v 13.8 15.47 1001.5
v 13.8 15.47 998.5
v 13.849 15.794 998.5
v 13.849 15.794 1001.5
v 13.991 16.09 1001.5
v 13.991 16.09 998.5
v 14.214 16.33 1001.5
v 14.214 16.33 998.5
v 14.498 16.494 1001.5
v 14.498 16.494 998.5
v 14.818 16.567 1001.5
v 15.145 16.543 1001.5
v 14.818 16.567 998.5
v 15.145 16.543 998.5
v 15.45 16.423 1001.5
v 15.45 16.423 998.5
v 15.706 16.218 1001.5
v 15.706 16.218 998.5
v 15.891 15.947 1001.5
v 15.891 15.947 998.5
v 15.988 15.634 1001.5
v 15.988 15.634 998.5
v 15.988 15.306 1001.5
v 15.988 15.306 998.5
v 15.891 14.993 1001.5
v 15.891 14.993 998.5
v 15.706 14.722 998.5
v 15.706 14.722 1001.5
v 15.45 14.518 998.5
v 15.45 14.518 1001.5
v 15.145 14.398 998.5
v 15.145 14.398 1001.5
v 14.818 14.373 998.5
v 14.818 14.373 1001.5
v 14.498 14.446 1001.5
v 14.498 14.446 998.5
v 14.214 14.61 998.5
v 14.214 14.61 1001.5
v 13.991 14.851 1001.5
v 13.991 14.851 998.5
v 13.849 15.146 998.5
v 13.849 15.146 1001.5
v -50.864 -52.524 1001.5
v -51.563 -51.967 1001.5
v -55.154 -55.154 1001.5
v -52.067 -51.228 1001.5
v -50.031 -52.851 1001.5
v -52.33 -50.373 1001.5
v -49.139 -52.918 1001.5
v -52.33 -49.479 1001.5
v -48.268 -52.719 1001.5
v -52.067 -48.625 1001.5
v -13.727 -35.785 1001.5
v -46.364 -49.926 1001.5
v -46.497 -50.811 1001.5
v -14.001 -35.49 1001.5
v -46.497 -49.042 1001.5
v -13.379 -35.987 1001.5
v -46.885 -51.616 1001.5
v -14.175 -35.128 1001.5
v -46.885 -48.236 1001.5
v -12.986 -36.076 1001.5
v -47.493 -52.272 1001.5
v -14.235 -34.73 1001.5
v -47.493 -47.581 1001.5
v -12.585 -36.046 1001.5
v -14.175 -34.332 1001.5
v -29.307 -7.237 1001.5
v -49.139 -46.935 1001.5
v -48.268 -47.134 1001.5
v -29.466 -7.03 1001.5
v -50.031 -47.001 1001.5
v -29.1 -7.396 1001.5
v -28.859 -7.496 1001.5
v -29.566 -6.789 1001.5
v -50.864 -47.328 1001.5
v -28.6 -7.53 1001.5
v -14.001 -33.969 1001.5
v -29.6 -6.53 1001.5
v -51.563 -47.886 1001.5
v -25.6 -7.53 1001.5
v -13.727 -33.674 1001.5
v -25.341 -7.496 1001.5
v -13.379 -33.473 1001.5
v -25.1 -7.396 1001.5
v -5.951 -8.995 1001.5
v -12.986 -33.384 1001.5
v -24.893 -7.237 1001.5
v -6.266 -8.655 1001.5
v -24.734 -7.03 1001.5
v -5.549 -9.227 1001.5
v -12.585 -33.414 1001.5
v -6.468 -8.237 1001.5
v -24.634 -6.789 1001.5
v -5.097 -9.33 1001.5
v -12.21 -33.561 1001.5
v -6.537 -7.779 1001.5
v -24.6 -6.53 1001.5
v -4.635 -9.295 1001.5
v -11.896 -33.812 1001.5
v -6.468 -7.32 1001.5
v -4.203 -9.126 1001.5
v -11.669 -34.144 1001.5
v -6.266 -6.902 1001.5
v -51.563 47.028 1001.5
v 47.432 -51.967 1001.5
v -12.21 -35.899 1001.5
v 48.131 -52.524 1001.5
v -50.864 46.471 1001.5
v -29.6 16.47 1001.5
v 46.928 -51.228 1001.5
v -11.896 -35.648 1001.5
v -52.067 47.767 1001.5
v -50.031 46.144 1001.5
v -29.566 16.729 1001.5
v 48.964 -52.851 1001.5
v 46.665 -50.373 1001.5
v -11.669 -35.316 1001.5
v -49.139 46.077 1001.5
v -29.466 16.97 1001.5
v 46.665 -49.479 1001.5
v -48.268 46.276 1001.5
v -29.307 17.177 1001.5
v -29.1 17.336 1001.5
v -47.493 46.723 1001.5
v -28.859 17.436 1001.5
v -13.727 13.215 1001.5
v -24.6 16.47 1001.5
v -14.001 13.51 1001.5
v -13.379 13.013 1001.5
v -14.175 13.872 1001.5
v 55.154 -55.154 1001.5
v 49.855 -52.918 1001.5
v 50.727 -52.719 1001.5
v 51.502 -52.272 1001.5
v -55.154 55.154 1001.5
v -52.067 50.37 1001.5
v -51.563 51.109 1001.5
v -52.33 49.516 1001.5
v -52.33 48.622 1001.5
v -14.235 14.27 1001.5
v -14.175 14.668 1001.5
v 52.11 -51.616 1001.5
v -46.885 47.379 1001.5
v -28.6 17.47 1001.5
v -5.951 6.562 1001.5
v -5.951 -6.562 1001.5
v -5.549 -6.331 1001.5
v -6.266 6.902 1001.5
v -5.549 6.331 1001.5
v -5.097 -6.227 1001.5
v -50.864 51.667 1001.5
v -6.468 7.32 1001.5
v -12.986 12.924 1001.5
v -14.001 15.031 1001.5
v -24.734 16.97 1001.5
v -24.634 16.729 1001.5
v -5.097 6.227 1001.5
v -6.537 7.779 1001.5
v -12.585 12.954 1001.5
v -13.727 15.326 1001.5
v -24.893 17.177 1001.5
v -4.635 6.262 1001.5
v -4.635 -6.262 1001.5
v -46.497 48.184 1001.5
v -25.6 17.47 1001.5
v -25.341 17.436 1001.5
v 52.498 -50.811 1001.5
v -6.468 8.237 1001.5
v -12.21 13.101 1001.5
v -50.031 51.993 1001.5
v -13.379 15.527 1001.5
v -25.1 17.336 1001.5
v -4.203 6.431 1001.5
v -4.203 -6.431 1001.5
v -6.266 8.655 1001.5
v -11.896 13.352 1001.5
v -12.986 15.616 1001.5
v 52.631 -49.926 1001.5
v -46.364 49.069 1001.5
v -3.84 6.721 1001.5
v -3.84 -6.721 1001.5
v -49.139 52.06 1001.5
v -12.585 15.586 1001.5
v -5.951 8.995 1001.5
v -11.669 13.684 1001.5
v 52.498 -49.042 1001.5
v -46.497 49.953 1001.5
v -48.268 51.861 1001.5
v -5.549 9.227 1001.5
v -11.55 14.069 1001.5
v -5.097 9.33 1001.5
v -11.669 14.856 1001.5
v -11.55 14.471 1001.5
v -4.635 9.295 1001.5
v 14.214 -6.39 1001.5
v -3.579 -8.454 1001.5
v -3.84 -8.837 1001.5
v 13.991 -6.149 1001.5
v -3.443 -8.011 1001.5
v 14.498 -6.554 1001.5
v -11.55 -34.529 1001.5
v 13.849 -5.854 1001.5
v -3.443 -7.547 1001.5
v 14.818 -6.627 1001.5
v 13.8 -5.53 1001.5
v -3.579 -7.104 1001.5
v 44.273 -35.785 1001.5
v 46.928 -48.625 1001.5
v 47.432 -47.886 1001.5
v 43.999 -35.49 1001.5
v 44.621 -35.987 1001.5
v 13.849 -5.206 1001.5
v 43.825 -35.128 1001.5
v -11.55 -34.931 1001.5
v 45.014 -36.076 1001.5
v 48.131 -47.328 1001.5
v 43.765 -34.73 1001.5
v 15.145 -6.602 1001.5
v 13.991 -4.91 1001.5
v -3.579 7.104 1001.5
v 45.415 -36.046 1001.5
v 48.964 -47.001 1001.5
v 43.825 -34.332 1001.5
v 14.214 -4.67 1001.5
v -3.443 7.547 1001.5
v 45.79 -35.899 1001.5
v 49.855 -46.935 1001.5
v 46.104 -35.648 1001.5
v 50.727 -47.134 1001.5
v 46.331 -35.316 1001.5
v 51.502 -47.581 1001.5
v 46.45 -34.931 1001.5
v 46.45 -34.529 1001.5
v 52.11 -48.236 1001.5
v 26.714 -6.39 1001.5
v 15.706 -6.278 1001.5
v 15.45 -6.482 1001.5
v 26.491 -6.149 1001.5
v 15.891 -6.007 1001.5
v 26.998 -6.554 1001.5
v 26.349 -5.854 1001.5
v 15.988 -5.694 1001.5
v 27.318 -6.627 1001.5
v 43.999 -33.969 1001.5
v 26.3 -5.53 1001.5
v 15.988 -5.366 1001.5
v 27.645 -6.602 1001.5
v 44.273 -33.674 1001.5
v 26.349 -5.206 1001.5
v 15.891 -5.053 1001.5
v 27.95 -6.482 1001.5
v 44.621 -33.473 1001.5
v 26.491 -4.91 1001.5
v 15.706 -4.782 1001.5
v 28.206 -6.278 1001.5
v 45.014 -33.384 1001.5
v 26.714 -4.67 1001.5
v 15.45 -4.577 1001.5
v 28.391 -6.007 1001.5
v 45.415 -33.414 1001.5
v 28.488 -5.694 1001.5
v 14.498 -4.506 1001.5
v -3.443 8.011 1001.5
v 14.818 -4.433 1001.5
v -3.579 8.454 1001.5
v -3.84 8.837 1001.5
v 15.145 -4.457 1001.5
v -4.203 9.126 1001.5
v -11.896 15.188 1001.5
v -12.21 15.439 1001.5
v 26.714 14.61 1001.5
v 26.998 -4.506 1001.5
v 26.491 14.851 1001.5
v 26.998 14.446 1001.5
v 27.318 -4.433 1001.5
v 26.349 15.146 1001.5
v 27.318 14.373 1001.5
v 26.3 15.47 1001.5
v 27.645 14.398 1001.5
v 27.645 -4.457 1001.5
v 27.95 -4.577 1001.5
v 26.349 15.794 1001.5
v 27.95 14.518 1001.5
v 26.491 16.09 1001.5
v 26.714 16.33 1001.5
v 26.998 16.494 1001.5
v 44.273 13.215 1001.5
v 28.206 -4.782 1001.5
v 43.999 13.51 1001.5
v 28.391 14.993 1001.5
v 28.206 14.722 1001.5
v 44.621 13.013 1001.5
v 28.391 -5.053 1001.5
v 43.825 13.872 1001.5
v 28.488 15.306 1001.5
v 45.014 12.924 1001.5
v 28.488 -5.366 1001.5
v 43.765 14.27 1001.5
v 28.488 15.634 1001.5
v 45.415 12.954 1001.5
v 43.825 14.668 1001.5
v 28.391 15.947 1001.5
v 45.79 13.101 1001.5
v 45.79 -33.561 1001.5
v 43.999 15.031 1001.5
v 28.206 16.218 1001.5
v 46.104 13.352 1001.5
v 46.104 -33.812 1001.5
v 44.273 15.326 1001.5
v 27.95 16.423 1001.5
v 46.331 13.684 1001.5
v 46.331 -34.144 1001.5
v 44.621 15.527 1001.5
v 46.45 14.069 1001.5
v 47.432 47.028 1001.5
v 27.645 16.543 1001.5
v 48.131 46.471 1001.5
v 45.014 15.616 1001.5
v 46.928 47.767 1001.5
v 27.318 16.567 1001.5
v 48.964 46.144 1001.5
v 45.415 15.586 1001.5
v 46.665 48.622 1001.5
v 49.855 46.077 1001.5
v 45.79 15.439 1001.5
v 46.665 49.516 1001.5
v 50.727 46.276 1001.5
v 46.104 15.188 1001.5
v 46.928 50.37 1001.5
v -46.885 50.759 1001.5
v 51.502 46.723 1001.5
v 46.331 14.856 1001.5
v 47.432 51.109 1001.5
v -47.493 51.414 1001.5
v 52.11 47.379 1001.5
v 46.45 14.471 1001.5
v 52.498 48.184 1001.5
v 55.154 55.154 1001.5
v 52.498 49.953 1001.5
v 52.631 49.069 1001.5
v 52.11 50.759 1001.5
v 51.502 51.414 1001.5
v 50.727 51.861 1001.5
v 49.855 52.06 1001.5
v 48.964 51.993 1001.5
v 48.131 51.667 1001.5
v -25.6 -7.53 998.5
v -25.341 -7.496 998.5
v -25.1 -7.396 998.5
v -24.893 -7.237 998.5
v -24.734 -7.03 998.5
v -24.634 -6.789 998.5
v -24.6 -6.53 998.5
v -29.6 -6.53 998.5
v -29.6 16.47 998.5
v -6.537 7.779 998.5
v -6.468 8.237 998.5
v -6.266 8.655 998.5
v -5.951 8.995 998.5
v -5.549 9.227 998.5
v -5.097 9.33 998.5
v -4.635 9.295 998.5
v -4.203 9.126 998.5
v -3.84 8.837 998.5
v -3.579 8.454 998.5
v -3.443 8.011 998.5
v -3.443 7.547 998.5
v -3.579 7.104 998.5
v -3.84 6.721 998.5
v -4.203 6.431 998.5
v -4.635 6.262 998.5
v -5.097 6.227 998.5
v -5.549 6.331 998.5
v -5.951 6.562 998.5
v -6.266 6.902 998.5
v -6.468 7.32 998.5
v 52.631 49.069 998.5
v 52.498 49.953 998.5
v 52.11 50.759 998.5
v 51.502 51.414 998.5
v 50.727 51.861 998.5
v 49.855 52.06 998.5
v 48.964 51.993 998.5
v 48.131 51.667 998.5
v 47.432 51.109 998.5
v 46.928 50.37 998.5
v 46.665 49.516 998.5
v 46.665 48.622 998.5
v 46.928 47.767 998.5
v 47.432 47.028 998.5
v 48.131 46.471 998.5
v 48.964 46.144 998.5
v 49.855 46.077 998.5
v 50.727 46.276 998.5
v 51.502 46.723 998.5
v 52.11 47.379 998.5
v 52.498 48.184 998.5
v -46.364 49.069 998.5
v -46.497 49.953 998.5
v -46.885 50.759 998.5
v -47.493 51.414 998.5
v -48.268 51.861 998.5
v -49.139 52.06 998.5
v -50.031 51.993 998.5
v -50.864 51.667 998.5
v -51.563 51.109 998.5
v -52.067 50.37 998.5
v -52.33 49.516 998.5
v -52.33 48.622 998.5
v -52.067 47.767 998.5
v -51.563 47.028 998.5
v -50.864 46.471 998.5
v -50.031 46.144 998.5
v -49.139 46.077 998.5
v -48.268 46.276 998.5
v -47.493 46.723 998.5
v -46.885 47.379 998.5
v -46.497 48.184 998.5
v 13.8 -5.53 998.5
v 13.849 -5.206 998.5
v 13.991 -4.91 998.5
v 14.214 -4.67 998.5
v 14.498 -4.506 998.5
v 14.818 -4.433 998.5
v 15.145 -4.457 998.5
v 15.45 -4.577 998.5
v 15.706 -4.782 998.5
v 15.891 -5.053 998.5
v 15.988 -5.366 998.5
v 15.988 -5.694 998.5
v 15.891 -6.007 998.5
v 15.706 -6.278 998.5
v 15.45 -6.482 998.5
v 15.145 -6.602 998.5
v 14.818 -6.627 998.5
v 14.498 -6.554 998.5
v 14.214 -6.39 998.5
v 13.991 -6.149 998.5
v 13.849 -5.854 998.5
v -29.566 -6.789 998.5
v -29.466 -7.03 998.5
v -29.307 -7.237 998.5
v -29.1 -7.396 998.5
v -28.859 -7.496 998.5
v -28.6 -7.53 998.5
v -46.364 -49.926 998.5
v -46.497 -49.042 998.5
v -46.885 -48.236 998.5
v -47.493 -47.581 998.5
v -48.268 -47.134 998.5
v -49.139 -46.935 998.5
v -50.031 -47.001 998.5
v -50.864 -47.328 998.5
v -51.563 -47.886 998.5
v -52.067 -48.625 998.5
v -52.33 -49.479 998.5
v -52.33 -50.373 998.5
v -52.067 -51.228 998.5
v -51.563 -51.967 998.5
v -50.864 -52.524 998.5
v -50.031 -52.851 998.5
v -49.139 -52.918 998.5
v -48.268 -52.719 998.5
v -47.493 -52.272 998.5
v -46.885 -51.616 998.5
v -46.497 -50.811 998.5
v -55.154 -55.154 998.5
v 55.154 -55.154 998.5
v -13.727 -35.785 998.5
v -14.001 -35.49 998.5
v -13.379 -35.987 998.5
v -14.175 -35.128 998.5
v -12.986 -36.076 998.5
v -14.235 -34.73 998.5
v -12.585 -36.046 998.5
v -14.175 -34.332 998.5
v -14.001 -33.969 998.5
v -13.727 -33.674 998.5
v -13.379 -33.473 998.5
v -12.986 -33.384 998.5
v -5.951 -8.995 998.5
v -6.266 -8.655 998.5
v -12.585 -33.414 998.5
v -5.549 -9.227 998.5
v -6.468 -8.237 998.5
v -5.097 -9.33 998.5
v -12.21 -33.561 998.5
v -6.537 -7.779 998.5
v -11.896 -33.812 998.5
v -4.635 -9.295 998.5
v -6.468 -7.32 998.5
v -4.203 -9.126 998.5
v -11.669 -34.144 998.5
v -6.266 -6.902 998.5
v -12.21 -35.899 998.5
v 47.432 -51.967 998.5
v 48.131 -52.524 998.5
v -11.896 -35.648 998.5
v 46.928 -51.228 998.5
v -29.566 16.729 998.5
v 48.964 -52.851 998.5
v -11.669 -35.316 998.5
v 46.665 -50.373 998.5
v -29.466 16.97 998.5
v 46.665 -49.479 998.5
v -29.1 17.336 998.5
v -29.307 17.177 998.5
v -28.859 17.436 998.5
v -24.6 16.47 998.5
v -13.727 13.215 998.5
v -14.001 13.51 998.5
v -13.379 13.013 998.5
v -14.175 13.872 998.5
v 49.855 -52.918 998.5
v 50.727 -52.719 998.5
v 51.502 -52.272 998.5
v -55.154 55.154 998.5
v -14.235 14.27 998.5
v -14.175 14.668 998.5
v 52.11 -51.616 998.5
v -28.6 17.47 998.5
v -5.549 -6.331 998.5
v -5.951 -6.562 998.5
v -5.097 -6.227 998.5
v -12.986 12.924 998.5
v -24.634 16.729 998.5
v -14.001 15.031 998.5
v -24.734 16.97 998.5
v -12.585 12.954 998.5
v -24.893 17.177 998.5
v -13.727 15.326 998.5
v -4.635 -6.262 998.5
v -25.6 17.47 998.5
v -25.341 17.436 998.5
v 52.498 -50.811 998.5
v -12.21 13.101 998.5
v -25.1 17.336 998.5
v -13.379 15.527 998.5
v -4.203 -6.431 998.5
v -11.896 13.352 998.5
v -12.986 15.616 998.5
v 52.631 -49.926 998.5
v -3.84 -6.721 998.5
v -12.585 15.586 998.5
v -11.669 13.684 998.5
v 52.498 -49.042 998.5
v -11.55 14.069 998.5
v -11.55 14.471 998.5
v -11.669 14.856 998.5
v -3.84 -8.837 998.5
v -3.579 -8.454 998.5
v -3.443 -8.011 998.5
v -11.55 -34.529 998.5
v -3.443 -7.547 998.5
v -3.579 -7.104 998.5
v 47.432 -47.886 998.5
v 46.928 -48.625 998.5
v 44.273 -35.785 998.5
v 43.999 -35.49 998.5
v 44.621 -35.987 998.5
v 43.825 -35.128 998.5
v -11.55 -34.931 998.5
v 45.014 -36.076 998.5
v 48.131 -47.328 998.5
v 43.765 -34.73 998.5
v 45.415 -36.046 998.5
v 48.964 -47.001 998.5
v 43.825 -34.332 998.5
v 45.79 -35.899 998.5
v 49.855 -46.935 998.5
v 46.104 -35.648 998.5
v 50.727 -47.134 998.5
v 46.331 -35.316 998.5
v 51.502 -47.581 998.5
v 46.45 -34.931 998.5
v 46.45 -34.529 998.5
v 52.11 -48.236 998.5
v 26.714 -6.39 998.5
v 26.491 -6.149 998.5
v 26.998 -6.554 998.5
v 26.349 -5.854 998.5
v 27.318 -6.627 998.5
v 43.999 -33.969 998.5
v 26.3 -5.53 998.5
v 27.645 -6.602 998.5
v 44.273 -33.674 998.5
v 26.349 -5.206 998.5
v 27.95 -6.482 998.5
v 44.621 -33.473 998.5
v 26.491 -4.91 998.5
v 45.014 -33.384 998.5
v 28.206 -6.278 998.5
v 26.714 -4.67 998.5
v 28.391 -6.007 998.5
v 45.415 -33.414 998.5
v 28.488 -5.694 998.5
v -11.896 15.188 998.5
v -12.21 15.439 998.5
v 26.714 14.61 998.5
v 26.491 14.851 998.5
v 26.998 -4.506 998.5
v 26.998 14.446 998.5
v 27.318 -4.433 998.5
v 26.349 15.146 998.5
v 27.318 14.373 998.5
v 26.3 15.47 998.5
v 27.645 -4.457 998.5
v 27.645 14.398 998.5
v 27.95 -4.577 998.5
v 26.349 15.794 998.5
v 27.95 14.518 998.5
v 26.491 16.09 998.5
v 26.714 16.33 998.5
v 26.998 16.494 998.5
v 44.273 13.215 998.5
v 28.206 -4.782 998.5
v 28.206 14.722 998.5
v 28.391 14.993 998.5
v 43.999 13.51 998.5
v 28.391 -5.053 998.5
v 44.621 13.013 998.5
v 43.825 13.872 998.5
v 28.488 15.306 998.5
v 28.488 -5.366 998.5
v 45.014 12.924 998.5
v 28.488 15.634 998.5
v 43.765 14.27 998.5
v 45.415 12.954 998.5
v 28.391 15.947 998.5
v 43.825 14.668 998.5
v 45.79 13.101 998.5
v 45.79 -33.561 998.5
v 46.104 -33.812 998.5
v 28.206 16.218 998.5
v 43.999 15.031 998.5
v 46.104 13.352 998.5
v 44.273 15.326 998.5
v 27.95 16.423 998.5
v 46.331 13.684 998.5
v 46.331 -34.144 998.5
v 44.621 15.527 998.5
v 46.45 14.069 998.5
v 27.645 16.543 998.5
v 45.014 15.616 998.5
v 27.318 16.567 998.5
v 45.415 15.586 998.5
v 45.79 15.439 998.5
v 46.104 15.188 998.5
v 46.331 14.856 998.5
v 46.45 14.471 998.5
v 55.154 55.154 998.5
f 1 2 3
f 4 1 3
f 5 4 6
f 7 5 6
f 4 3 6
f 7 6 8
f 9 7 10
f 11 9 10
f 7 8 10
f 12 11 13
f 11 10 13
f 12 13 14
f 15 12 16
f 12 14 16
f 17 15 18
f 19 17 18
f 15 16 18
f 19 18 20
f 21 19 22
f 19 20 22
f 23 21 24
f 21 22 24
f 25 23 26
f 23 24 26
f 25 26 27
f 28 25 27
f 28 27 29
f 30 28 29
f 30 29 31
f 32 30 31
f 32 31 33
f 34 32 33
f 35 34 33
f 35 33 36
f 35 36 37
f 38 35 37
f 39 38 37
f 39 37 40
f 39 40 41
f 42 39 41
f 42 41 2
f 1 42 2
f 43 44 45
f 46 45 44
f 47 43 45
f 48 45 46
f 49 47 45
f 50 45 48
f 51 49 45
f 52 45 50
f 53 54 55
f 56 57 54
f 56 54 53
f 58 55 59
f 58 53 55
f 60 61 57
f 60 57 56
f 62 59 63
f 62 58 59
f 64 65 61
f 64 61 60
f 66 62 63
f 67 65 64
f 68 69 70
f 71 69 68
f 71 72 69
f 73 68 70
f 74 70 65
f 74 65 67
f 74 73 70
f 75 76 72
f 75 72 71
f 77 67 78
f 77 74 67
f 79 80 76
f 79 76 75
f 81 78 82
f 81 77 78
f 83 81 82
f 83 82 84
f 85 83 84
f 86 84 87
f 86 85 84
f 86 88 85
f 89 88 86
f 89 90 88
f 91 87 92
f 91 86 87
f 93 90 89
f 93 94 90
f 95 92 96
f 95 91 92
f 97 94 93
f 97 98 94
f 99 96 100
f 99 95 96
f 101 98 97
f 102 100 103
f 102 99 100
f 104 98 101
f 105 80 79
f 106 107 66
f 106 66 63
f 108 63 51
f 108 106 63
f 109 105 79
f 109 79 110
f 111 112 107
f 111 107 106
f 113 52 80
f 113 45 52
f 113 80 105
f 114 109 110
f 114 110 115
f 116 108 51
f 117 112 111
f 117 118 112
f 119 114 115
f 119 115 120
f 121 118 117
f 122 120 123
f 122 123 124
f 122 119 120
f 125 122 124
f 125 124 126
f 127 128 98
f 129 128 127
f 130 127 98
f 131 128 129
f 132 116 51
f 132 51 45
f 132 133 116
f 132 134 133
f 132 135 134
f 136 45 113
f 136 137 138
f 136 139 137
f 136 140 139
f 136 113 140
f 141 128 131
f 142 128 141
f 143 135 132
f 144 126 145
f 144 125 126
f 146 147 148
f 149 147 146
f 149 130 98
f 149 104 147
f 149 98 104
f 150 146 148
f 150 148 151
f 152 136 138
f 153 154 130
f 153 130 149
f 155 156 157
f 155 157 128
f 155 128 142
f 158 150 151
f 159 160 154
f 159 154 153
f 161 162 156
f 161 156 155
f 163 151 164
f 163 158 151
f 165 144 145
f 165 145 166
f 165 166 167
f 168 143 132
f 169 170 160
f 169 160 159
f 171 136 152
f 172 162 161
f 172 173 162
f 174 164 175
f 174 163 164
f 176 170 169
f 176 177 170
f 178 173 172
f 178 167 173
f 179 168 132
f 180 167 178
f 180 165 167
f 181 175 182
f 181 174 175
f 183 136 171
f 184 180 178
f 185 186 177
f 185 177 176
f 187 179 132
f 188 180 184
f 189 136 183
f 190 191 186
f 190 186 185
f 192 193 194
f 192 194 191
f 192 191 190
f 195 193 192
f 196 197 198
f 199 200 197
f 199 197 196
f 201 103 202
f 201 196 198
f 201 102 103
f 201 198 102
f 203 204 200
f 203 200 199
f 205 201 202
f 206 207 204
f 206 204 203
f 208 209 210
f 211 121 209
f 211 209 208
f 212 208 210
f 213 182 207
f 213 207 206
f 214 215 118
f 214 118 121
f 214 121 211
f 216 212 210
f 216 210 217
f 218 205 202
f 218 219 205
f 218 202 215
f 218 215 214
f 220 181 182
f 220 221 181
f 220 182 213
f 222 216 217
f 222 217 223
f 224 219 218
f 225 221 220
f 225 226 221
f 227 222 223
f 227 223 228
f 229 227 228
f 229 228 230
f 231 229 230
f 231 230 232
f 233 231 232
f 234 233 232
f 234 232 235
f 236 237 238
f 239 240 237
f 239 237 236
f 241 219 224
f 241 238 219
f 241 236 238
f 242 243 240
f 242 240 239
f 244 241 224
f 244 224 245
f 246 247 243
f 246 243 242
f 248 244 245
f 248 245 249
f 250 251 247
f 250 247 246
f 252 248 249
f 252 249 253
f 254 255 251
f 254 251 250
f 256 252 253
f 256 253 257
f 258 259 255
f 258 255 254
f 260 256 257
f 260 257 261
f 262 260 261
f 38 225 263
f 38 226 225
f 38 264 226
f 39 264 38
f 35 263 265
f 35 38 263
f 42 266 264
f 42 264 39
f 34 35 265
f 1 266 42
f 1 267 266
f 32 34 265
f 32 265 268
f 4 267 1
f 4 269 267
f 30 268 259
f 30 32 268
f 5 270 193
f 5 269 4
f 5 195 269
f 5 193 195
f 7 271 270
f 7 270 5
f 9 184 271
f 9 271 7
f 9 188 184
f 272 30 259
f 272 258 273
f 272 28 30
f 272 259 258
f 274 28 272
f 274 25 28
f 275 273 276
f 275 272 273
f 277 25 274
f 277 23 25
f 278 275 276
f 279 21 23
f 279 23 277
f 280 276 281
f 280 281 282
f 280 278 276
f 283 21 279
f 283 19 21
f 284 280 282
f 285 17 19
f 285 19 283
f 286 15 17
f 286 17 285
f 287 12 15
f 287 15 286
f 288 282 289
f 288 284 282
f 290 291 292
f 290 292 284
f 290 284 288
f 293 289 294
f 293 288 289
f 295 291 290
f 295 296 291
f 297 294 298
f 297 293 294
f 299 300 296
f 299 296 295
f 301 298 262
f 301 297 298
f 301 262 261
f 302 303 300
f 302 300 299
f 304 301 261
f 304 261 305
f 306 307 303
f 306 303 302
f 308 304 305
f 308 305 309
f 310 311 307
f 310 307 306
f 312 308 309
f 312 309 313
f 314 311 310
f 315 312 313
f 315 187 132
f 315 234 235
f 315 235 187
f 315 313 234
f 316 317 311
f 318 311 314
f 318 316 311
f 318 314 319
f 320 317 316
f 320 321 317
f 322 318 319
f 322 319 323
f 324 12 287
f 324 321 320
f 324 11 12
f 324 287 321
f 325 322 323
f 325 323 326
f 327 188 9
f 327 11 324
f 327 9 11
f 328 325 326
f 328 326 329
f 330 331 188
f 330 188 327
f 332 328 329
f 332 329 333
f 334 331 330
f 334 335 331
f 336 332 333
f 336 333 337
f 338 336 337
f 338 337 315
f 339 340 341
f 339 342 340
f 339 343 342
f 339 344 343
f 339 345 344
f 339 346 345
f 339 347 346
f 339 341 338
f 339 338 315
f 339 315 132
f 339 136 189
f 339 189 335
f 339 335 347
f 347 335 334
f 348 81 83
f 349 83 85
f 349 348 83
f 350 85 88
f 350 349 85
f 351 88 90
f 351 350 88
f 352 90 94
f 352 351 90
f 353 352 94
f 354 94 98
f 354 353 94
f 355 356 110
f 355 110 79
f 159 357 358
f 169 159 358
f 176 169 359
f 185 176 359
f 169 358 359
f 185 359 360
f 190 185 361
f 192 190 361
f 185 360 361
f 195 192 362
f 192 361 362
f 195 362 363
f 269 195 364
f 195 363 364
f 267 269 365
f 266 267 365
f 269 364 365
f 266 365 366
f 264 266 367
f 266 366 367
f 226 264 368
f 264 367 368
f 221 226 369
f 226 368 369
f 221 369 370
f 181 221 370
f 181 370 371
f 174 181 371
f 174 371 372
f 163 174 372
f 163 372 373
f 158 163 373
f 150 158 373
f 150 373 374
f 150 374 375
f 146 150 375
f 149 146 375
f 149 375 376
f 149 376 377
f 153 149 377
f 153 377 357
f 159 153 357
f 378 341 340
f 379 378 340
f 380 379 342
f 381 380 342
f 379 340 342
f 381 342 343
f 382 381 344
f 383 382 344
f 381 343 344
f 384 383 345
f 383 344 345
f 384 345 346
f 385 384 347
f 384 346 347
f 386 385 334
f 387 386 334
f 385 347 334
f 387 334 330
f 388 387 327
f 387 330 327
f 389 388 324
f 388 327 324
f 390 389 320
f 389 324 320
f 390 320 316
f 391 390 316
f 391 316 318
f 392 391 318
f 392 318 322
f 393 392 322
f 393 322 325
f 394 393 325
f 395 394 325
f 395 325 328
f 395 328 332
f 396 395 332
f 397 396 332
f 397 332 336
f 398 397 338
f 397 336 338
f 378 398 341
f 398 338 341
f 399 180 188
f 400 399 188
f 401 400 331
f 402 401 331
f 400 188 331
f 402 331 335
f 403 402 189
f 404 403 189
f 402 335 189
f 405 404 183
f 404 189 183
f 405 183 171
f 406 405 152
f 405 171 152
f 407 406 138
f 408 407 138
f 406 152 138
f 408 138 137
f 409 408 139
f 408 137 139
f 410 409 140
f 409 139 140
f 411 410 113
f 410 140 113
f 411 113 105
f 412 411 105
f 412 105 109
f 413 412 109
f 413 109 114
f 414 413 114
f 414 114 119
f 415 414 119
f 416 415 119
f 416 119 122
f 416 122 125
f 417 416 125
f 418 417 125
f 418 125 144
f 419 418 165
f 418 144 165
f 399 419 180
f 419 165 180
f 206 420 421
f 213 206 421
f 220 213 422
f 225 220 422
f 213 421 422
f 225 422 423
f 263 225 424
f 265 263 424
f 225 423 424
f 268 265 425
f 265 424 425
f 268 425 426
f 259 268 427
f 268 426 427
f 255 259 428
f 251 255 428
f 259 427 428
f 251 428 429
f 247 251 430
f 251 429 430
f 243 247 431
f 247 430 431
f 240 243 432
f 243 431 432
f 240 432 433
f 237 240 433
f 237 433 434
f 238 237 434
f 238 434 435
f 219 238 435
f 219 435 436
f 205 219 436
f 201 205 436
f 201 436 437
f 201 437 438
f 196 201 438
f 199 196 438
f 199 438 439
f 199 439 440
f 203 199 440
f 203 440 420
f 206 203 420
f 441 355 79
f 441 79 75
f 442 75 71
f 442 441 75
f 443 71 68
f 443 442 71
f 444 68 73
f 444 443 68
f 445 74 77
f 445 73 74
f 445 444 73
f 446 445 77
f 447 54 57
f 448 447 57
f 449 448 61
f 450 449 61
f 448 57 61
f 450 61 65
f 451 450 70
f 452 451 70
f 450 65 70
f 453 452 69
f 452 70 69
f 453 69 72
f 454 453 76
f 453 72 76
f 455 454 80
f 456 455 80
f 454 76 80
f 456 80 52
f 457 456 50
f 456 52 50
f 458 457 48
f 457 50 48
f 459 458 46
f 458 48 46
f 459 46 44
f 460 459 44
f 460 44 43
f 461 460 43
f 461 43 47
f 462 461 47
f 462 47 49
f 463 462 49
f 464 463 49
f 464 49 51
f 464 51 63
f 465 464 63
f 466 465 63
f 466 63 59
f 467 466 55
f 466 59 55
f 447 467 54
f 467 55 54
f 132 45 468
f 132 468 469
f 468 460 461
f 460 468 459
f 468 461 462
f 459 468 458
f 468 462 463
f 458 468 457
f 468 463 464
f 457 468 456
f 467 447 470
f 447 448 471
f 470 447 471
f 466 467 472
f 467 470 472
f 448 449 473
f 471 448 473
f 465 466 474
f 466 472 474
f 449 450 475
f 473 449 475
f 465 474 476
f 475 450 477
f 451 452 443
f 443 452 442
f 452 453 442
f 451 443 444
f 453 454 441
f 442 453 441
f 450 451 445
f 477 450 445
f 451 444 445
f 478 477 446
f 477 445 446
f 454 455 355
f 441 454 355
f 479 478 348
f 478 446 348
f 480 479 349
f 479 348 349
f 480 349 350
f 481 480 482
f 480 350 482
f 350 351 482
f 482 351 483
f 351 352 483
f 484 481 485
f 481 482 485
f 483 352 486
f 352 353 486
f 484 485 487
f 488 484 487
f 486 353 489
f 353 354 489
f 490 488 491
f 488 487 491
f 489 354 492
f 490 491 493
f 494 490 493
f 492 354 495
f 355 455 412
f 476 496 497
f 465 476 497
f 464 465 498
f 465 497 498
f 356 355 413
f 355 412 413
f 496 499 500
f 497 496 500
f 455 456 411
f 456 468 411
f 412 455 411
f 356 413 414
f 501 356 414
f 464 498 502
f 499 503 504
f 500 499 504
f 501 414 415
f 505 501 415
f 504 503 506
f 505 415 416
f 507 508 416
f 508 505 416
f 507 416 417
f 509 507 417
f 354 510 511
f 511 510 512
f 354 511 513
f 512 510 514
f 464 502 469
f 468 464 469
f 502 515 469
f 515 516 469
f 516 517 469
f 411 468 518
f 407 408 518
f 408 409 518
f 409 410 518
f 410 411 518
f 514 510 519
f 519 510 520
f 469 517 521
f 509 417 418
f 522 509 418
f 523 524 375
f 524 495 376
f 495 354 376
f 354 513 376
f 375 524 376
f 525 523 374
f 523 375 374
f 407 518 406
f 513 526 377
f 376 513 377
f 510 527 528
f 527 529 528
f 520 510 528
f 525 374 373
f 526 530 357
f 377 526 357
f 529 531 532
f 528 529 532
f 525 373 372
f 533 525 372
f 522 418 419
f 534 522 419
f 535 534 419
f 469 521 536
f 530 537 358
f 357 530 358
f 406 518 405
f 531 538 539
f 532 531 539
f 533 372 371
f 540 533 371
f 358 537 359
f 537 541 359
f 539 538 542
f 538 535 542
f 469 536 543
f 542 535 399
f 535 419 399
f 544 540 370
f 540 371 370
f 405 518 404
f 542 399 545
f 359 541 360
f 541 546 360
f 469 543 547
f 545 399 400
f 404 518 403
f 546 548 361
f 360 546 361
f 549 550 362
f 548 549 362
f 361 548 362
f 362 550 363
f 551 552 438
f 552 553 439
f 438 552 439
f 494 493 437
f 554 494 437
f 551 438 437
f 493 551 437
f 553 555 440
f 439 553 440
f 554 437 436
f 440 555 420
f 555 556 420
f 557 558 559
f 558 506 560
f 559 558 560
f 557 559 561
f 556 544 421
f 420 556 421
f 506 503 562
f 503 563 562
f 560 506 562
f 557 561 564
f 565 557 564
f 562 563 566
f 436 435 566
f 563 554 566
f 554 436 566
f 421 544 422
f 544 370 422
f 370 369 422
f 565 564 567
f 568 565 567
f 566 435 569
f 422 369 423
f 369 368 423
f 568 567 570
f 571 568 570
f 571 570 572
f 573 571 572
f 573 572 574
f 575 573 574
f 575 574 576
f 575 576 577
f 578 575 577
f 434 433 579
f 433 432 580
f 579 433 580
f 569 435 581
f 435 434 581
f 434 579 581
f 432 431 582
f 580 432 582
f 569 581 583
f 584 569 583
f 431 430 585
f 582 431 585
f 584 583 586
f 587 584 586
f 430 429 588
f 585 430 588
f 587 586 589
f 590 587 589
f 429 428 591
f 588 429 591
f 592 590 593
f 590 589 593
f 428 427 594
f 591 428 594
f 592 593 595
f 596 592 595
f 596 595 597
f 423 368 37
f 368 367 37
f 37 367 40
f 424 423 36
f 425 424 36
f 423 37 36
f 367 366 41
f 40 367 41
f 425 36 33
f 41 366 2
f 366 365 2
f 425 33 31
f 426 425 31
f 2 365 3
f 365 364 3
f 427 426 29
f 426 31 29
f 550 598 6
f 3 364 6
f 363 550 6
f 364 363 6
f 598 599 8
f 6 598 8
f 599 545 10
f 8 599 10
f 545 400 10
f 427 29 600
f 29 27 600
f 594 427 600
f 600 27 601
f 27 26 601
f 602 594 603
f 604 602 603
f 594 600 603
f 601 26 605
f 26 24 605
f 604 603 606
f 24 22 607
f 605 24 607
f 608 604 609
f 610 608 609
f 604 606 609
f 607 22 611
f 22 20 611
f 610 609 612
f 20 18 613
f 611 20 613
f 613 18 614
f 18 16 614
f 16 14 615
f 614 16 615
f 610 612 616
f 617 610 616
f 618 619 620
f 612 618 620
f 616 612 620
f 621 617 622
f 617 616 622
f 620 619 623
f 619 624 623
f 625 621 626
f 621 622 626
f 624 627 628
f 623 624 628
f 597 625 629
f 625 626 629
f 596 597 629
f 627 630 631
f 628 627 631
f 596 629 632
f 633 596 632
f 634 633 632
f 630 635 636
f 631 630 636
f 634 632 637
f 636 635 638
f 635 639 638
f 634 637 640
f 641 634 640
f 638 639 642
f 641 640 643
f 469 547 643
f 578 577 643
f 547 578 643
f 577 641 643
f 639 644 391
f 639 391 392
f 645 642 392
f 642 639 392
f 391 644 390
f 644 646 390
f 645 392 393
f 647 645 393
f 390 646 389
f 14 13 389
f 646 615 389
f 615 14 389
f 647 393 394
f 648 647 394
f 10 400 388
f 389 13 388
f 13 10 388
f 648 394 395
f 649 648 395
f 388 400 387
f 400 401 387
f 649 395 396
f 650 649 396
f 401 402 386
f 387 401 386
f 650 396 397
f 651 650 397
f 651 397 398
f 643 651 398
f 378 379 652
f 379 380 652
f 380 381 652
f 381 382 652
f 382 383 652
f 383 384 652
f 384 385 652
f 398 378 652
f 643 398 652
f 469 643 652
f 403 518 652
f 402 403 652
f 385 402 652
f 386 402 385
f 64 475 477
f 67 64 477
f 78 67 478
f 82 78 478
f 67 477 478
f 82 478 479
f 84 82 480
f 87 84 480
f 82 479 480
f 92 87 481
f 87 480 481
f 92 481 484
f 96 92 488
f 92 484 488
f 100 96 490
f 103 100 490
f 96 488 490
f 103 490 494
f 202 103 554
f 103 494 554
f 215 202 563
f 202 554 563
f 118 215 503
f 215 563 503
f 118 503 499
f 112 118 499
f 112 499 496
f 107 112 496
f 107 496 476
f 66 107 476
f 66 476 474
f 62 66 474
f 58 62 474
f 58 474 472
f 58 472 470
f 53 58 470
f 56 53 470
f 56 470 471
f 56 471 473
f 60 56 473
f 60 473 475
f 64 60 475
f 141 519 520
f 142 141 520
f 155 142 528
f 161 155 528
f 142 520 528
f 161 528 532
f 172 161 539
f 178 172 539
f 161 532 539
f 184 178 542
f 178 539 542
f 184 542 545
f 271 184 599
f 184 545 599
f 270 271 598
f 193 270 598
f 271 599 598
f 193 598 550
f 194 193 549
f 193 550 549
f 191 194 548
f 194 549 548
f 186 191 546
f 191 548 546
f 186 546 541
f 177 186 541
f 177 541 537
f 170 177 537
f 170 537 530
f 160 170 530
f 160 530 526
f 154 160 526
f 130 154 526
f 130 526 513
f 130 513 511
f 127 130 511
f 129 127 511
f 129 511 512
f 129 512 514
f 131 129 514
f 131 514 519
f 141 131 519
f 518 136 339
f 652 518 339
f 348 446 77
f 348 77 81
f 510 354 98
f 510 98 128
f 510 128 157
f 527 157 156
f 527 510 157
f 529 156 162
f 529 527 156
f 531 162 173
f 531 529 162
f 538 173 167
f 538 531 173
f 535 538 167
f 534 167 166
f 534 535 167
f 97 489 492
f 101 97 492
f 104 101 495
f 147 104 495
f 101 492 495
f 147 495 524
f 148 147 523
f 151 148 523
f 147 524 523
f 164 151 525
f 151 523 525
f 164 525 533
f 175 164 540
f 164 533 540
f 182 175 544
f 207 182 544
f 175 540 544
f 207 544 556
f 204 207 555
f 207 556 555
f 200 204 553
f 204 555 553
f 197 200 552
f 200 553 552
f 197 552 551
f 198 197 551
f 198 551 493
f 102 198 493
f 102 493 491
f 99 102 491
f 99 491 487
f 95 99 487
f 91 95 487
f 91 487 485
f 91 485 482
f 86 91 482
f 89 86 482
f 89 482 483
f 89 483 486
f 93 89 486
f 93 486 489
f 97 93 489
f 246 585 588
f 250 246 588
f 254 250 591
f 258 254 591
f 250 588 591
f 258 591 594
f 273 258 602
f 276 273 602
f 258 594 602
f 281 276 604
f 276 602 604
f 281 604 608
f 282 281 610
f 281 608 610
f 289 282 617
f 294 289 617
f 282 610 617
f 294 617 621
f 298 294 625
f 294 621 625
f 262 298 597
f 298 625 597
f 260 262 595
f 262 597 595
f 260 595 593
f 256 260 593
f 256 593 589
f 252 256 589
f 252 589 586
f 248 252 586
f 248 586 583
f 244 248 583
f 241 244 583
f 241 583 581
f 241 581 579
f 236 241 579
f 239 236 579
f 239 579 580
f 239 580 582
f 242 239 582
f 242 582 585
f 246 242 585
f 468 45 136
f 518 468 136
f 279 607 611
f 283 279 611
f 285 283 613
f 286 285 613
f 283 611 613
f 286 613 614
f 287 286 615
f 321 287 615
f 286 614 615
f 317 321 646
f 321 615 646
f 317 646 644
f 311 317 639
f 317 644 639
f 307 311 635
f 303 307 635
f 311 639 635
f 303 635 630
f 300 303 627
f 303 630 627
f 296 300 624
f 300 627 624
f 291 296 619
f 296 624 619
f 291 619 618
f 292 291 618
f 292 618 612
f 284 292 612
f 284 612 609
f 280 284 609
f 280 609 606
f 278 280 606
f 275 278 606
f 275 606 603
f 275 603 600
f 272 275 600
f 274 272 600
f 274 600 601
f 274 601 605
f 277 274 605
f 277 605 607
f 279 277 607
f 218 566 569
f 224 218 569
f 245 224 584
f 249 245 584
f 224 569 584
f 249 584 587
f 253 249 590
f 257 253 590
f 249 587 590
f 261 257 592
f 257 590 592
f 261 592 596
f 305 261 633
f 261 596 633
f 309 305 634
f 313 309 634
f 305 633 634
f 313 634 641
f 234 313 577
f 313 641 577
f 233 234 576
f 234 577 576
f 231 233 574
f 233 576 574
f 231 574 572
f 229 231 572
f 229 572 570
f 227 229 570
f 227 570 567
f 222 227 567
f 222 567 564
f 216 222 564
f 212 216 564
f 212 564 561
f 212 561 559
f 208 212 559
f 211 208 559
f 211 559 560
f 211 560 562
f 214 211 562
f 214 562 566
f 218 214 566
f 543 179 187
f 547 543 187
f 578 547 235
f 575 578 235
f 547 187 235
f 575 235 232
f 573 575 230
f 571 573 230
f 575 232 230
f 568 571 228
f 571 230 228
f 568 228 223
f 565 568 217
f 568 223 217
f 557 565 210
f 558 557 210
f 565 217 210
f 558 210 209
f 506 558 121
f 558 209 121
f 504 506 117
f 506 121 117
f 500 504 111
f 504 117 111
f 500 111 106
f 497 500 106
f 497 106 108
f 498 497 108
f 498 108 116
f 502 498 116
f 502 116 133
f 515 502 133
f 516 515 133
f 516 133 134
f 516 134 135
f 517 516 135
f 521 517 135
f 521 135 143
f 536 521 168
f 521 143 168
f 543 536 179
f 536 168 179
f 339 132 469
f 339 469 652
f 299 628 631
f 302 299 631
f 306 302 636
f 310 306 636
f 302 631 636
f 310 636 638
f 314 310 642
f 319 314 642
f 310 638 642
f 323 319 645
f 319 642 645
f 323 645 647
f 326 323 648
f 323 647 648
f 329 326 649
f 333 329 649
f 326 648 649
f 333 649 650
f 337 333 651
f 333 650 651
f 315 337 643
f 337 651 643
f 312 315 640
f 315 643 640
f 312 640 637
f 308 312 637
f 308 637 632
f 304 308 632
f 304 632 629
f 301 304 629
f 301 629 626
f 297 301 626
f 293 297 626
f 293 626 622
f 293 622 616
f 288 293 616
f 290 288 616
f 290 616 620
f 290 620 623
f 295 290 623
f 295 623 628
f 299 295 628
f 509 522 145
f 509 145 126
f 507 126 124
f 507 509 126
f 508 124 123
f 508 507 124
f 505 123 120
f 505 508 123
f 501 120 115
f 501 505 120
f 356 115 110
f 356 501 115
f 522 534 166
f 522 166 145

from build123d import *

# Parameters (mm, degrees)
CROQUIS1_W              = 110.308657865
CROQUIS1_H              = 110.308657866
CROQUIS1_R              = 3
SALIENTE_EXTRUIR1_DEPTH = 3
CROQUIS3_R              = 1.35
CORTAR_EXTRUIR1_DEPTH   = 4
SKETCH2_R               = 1.55575
CUT_EXTRUDE1_DEPTH      = 4
SKETCH1_R               = 1.1
CUT_EXTRUDE2_DEPTH      = 4


with BuildPart() as part:
    # Croquis1 → Saliente-Extruir1 (new body)
    with BuildSketch(Plane(origin=(25.025391454, -7.129133069, 1001.5), x_dir=(1, 0, 0), z_dir=(0, 0, 1))):
        with Locations((-25.025391455, 7.129133069)):
            Rectangle(CROQUIS1_W, CROQUIS1_H)
        with Locations((-74.389051931, 56.197819511)):
            Circle(CROQUIS1_R, mode=Mode.SUBTRACT)
        with Locations((24.605897435, -42.797129855)):
            Circle(CROQUIS1_R, mode=Mode.SUBTRACT)
        with Locations((-74.389051931, -42.797129855)):
            Circle(CROQUIS1_R, mode=Mode.SUBTRACT)
        with Locations((24.605897435, 56.197819511)):
            Circle(CROQUIS1_R, mode=Mode.SUBTRACT)
    extrude(amount=-SALIENTE_EXTRUIR1_DEPTH)

    # Croquis3 → Cortar-Extruir1 (cut, through all)
    with BuildSketch(Plane(origin=(25.025391454, -7.129133069, 998.5), x_dir=(-1, 0, 0), z_dir=(0, 0, -1))):
        with Locations((37.910718234, 21.399287334)):
            Circle(CROQUIS3_R)
        with Locations((37.910718234, -27.600712666)):
            Circle(CROQUIS3_R)
        with Locations((-20.089281766, -27.600712666)):
            Circle(CROQUIS3_R)
        with Locations((-20.089281766, 21.399287334)):
            Circle(CROQUIS3_R)
    extrude(amount=-CORTAR_EXTRUIR1_DEPTH, mode=Mode.SUBTRACT)

    # Sketch2 → Cut-Extrude1 (cut, through all)
    with BuildSketch(Plane(origin=(25.025391454, -7.129133069, 998.5), x_dir=(-1, 0, 0), z_dir=(0, 0, -1))):
        with Locations((30.006327248, 14.907883069)):
            Circle(SKETCH2_R)
        with Locations((30.006327248, -0.649616931)):
            Circle(SKETCH2_R)
    extrude(amount=-CUT_EXTRUDE1_DEPTH, mode=Mode.SUBTRACT)

    # Sketch1 → Cut-Extrude2 (cut, through all)
    with BuildSketch(Plane(origin=(25.025391454, -7.129133069, 998.5), x_dir=(-1, 0, 0), z_dir=(0, 0, -1))):
        with Locations((-2.374608546, 22.599287334)):
            Circle(SKETCH1_R)
        with Locations((10.125391454, 22.599287334)):
            Circle(SKETCH1_R)
        with Locations((10.125391454, 1.599287334)):
            Circle(SKETCH1_R)
        with Locations((-2.374608546, 1.599287334)):
            Circle(SKETCH1_R)
        with BuildLine():
            Line((50.625391454, 24.599287334), (53.625391454, 24.599287334))
            ThreePointArc((53.625391454, 24.599287334), (54.332498236, 24.306394115), (54.625391454, 23.599287334))
            Line((54.625391454, 23.599287334), (54.625391454, 0.599287334))
            ThreePointArc((54.625391454, 0.599287334), (54.332498236, -0.107819447), (53.625391454, -0.400712666))
            Line((53.625391454, -0.400712666), (50.625391454, -0.400712666))
            ThreePointArc((50.625391454, -0.400712666), (49.918284673, -0.107819447), (49.625391454, 0.599287334))
            Line((49.625391454, 0.599287334), (49.625391454, 23.599287334))
            ThreePointArc((49.625391454, 23.599287334), (49.918284673, 24.306394115), (50.625391454, 24.599287334))
        make_face()
    extrude(amount=-CUT_EXTRUDE2_DEPTH, mode=Mode.SUBTRACT)


solid = part.part
